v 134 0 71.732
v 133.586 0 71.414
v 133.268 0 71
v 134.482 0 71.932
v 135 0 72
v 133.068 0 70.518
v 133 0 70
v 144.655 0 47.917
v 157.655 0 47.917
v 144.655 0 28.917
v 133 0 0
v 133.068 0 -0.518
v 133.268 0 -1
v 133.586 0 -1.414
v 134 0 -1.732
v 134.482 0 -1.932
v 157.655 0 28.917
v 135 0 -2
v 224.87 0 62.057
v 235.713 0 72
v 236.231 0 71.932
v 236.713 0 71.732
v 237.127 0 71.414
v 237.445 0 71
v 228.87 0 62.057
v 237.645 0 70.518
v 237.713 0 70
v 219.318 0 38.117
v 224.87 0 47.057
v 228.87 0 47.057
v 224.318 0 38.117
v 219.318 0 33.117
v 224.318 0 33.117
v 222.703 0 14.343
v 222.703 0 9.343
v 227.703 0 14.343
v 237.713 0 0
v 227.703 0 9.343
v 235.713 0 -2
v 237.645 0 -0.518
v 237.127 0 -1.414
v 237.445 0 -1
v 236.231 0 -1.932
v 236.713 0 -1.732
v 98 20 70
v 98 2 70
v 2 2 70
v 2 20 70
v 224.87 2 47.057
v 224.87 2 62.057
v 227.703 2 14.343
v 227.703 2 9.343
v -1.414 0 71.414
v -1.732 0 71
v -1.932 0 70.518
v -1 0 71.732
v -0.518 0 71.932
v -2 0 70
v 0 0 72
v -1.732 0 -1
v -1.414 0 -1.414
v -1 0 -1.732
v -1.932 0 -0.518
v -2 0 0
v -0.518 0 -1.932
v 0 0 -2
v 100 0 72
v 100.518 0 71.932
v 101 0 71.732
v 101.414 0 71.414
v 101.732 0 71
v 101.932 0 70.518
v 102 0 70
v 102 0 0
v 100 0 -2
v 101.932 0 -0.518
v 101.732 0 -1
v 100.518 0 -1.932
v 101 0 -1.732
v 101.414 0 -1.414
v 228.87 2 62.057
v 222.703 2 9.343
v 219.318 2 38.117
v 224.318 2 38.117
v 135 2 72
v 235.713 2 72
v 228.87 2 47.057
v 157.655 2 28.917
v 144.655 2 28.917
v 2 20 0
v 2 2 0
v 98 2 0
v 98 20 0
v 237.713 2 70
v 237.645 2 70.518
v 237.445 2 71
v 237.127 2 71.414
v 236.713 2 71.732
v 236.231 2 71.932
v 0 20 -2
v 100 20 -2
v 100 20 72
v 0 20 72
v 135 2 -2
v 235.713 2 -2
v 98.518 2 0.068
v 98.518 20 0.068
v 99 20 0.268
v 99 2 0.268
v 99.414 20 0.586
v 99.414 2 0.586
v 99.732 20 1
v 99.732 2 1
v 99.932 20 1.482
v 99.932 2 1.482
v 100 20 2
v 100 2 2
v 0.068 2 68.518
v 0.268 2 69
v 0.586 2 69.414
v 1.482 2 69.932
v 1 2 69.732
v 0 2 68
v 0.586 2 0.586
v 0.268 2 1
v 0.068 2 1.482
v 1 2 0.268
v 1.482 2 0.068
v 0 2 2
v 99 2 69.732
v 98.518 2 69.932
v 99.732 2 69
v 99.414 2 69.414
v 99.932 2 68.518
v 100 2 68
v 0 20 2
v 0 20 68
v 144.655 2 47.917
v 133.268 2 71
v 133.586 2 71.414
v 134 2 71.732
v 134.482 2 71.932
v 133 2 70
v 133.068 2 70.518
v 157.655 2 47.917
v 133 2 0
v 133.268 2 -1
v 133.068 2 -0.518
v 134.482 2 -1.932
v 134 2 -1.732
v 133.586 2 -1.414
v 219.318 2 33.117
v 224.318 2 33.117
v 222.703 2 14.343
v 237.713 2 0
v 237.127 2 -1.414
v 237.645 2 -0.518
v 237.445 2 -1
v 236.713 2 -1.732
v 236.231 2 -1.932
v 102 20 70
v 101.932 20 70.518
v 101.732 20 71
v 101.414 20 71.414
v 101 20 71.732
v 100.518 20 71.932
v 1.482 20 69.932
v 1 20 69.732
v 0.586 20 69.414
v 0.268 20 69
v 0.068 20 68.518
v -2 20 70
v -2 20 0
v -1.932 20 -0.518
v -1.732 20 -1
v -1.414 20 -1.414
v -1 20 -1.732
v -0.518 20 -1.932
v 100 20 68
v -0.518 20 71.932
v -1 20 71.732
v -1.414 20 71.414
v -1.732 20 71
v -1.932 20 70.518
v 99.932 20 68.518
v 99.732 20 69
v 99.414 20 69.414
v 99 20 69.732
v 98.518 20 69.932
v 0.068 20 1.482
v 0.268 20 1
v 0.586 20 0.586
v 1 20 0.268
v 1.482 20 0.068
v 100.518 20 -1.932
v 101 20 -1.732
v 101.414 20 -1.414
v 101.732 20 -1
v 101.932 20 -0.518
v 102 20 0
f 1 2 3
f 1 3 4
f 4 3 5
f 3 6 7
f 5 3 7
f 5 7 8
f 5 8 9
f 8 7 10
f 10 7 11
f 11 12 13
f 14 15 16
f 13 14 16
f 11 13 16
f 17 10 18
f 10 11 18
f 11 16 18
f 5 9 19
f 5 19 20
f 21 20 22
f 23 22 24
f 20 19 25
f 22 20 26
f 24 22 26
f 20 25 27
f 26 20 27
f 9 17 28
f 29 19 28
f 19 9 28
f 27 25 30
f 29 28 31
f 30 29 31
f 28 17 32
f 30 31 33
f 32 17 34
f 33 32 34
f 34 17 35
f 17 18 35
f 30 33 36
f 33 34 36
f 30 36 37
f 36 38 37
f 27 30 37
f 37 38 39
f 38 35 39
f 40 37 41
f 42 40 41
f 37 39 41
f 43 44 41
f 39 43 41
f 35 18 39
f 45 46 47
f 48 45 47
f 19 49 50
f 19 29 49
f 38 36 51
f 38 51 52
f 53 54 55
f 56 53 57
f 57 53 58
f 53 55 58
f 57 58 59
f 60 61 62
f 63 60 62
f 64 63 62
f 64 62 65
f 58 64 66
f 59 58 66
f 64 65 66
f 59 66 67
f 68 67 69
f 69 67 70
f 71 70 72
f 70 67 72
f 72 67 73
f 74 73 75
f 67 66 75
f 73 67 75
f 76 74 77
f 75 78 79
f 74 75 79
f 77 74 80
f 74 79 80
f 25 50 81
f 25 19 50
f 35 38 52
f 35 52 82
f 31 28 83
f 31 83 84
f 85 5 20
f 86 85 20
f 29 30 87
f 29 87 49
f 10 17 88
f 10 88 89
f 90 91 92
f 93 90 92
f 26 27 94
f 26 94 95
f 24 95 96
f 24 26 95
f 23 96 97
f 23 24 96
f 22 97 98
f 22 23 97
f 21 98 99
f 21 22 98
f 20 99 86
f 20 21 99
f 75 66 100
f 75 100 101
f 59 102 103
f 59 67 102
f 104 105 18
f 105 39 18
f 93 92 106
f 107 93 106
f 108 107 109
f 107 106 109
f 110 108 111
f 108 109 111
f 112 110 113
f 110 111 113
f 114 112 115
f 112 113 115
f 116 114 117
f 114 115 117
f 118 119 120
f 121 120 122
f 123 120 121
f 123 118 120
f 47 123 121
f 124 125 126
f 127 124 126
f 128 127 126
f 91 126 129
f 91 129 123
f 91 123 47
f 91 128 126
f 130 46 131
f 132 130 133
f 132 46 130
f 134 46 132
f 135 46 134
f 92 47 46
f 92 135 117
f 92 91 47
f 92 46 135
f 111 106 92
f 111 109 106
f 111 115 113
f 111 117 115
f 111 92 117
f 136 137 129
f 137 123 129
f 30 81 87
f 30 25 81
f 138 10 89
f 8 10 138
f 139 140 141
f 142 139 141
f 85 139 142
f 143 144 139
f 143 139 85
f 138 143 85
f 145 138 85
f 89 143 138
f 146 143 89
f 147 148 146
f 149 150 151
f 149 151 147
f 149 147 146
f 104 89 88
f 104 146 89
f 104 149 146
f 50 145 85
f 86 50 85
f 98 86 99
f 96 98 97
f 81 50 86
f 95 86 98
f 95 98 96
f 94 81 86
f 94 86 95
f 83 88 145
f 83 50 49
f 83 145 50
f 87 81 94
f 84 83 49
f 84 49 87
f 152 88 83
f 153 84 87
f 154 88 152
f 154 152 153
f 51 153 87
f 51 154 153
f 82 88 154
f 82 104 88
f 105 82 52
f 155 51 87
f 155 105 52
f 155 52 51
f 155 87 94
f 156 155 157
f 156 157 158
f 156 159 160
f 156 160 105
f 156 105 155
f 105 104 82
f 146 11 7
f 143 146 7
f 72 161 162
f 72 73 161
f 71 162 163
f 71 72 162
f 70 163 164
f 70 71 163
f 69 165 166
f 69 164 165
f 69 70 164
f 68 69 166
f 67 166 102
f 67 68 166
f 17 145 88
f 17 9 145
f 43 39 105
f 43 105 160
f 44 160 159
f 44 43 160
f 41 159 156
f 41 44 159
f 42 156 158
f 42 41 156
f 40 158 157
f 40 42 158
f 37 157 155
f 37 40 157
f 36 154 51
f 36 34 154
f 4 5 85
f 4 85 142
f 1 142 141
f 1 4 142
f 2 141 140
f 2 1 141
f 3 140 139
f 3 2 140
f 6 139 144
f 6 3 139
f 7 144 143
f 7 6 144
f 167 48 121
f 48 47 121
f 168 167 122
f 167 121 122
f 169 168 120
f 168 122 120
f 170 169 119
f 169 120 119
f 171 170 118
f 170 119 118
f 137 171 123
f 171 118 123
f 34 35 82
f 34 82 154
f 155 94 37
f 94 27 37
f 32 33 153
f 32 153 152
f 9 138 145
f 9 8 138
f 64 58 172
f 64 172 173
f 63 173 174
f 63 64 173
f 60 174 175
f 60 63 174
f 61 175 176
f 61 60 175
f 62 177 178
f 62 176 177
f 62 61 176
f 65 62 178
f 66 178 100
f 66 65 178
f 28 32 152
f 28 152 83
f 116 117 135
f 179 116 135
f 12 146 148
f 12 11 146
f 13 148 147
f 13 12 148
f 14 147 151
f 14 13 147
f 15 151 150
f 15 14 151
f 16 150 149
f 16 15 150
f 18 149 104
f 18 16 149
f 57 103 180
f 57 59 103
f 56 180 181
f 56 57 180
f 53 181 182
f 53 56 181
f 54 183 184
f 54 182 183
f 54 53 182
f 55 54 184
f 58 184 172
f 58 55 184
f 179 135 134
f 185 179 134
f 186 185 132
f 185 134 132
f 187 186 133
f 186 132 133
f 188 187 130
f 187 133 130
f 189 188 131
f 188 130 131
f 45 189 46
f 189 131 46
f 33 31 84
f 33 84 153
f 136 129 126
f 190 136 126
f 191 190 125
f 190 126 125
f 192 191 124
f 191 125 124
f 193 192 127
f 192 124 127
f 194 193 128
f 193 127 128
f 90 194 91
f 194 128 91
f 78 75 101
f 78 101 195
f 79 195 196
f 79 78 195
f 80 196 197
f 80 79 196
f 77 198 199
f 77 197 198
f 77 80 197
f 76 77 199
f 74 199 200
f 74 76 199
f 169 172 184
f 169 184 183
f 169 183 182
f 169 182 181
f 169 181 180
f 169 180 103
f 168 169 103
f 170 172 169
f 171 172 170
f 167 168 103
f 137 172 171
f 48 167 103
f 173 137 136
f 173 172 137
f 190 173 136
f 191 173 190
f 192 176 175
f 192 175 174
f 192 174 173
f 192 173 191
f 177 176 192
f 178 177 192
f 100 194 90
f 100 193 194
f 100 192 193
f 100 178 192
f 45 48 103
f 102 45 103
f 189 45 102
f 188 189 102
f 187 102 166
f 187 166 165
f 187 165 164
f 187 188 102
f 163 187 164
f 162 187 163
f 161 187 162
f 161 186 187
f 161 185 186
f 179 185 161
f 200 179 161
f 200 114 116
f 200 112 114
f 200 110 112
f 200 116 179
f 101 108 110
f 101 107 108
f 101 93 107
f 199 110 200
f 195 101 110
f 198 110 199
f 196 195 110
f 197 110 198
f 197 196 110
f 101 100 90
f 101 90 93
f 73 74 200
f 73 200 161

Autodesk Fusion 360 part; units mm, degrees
sketch "Sketch1" plane through (0, 0, 0) normal (0, 1, 0) x (1, 0, 0) in component "sketch1"
  line L0 (2, 0) -> (98, 0)
  line L1 (100, -2) -> (100, -68)
  line L2 (98, -70) -> (2, -70)
  line L3 (0, -68) -> (0, -2)
  line L4 (0, 2) -> (100, 2)
  line L5 (102, 0) -> (102, -70)
  line L6 (100, -72) -> (0, -72)
  line L7 (-2, -70) -> (-2, 0)
  arc A0 (-2, -70) -> (0, -72) centre (0, -70) ccw
  arc A1 (0, 2) -> (-2, 0) centre (0, 0) ccw
  arc A2 (102, 0) -> (100, 2) centre (100, 0) ccw
  arc A3 (100, -72) -> (102, -70) centre (100, -70) ccw
  arc A4 (0, -68) -> (2, -70) centre (2, -68) ccw
  arc A5 (2, 0) -> (0, -2) centre (2, -2) ccw
  arc A6 (100, -2) -> (98, 0) centre (98, -2) ccw
  arc A7 (98, -70) -> (100, -68) centre (98, -68) ccw
  point P0 (100, 0)
  point P1 (0, -70)
  dimension "d1" = 100
  dimension "d2" = 70
  dimension "d4" = 2
  dimension "d5" = 2
extrude "Extrude1" add sketch "Sketch1" along normal blind 2 contours L0 L1 L2 L3 A4 A5 A6 A7 makes body 1 in component "sketch1"
extrude "Extrude2" add sketch "Sketch1" along normal blind 2 bodies 1 in component "sketch1"
extrude "Extrude3" add sketch "Sketch1" along normal blind 20 bodies 1 in component "sketch1"
sketch "Sketch2" plane through (0, 0, 0) normal (0, 1, 0) x (1, 0, 0) in component "sketch1"
  line L0 (137, -70) -> (233.713, -70)
  line L1 (235.713, -68) -> (235.713, -2)
  line L2 (233.713, 0) -> (137, 0)
  line L3 (135, -2) -> (135, -68)
  line L4 (235.713, 2) -> (135, 2)
  line L5 (133, 0) -> (133, -70)
  line L6 (135, -72) -> (235.713, -72)
  line L7 (237.713, -70) -> (237.713, 0)
  arc A0 (133, -70) -> (135, -72) centre (135, -70) ccw
  arc A1 (135, 2) -> (133, 0) centre (135, 0) ccw
  arc A2 (237.713, 0) -> (235.713, 2) centre (235.713, 0) ccw
  arc A3 (235.713, -72) -> (237.713, -70) centre (235.713, -70) ccw
  arc A4 (135, -68) -> (137, -70) centre (137, -68) ccw
  arc A5 (137, 0) -> (135, -2) centre (137, -2) ccw
  arc A6 (235.713, -2) -> (233.713, 0) centre (233.713, -2) ccw
  arc A7 (233.713, -70) -> (235.713, -68) centre (233.713, -68) ccw
  line L8 (144.6546, -47.9172) -> (157.6546, -47.9172)
  line L9 (157.6546, -47.9172) -> (157.6546, -28.9172)
  line L10 (157.6546, -28.9172) -> (144.6546, -28.9172)
  line L11 (144.6546, -28.9172) -> (144.6546, -47.9172)
  line L12 (219.3175, -38.1174) -> (224.3175, -38.1174)
  line L13 (224.3175, -38.1174) -> (224.3175, -33.1174)
  line L14 (224.3175, -33.1174) -> (219.3175, -33.1174)
  line L15 (219.3175, -33.1174) -> (219.3175, -38.1174)
  line L16 (222.7027, -14.343) -> (227.7027, -14.343)
  line L17 (227.7027, -14.343) -> (227.7027, -9.343)
  line L18 (227.7027, -9.343) -> (222.7027, -9.343)
  line L19 (222.7027, -9.343) -> (222.7027, -14.343)
  line L20 (224.8697, -62.0573) -> (228.8697, -62.0573)
  line L21 (228.8697, -62.0573) -> (228.8697, -47.0573)
  line L22 (228.8697, -47.0573) -> (224.8697, -47.0573)
  line L23 (224.8697, -47.0573) -> (224.8697, -62.0573)
  point P0 (135, -70)
  point P1 (235.713, -70)
  point P2 (135, 0)
  dimension "d12" = 100.713
  dimension "d13" = 70
  dimension "d15" = 2
  dimension "d16" = 2
  dimension "d21" = 13
  dimension "d22" = 19
  dimension "d23" = 5
  dimension "d24" = 5
  dimension "d25" = 5
  dimension "d26" = 5
  dimension "d33" = 4
  dimension "d34" = 15
extrude "Extrude4" add sketch "Sketch2" along normal blind 2 separate body contours L0 L1 L2 L3 A4 A5 A6 A7 | L8 L9 L10 L11 | L12 L13 L14 L15 | L16 L17 L18 L19 | L20 L21 L22 L23 makes body 2 in component "sketch1"
extrude "Extrude5" add sketch "Sketch2" along normal blind 2 contours L4 L5 L6 L7 A0 A1 A2 A3 bodies 2 in component "sketch1"
extrude "Extrude6" cut sketch "Sketch2" along normal blind 2 contours L8 L9 L10 L11 bodies 2 in component "sketch1"
extrude "Extrude7" cut sketch "Sketch2" along normal blind 2 contours L12 L13 L14 L15 bodies 2 in component "sketch1"
extrude "Extrude8" cut sketch "Sketch2" along normal blind 2 contours L16 L17 L18 L19 bodies 2 in component "sketch1"
extrude "Extrude9" cut sketch "Sketch2" along normal blind 2 contours L20 L21 L22 L23 bodies 2 in component "sketch1"
component "sketch1" placed x (1, 0, 0) y (0, 1, 0) z (0, 0, 1) at (0, 0, 0)
